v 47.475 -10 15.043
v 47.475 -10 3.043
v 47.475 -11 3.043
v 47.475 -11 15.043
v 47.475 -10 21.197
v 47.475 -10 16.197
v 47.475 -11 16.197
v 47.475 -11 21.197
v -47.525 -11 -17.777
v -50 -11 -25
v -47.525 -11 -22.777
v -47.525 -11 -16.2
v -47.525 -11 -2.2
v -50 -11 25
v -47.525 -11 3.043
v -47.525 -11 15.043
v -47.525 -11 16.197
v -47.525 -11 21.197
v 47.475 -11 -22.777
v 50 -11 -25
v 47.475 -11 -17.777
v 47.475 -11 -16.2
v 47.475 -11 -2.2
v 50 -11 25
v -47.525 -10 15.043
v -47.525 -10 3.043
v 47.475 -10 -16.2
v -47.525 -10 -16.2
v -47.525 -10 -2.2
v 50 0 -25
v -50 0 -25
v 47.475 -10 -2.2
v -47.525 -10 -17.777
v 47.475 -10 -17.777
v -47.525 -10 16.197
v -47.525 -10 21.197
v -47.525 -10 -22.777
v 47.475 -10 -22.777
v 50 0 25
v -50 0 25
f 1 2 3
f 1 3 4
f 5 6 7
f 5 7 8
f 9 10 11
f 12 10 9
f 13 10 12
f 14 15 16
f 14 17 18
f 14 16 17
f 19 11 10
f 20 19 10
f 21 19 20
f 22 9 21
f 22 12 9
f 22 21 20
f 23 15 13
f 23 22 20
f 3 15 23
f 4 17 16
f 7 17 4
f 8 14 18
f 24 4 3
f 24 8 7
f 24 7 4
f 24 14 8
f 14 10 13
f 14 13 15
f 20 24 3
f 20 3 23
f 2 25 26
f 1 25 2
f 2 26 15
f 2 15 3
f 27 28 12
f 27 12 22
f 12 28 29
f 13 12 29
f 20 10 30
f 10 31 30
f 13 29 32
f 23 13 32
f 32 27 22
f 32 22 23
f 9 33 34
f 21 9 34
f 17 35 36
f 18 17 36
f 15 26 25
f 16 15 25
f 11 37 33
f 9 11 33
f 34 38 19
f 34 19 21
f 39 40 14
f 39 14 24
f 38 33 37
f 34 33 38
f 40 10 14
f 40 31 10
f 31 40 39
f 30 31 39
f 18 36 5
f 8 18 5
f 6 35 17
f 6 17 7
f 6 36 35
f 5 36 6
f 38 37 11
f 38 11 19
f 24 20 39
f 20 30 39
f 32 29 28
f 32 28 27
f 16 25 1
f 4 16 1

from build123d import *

# Parameters (mm, degrees)
F0_W     = 100
F0_H     = 50
F1_DEPTH = 10
F2_W     = 100
F2_H     = 50
F2_W_2   = 95
F2_H_2   = 5
F2_H_3   = 14
F2_H_4   = 12
F3_DEPTH = 1


with BuildPart() as f1:
    # F0 (on Front) → F1 (new body)
    with BuildSketch(Plane.XZ):
        Rectangle(F0_W, F0_H)
    extrude(amount=F1_DEPTH)

    # F2 (on face) → F3 (join)
    with BuildSketch(Plane.XZ.offset(10)):
        Rectangle(F2_W, F2_H)
        with Locations((-0.025468, -20.277101)):
            Rectangle(F2_W_2, F2_H_2, mode=Mode.SUBTRACT)
        with Locations((-0.025468, -9.200179)):
            Rectangle(F2_W_2, F2_H_3, mode=Mode.SUBTRACT)
        with Locations((-0.025468, 9.043411)):
            Rectangle(F2_W_2, F2_H_4, mode=Mode.SUBTRACT)
        with Locations((-0.025468, 18.697258)):
            Rectangle(F2_W_2, F2_H_2, mode=Mode.SUBTRACT)
    extrude(amount=F3_DEPTH)


solid = f1.part
